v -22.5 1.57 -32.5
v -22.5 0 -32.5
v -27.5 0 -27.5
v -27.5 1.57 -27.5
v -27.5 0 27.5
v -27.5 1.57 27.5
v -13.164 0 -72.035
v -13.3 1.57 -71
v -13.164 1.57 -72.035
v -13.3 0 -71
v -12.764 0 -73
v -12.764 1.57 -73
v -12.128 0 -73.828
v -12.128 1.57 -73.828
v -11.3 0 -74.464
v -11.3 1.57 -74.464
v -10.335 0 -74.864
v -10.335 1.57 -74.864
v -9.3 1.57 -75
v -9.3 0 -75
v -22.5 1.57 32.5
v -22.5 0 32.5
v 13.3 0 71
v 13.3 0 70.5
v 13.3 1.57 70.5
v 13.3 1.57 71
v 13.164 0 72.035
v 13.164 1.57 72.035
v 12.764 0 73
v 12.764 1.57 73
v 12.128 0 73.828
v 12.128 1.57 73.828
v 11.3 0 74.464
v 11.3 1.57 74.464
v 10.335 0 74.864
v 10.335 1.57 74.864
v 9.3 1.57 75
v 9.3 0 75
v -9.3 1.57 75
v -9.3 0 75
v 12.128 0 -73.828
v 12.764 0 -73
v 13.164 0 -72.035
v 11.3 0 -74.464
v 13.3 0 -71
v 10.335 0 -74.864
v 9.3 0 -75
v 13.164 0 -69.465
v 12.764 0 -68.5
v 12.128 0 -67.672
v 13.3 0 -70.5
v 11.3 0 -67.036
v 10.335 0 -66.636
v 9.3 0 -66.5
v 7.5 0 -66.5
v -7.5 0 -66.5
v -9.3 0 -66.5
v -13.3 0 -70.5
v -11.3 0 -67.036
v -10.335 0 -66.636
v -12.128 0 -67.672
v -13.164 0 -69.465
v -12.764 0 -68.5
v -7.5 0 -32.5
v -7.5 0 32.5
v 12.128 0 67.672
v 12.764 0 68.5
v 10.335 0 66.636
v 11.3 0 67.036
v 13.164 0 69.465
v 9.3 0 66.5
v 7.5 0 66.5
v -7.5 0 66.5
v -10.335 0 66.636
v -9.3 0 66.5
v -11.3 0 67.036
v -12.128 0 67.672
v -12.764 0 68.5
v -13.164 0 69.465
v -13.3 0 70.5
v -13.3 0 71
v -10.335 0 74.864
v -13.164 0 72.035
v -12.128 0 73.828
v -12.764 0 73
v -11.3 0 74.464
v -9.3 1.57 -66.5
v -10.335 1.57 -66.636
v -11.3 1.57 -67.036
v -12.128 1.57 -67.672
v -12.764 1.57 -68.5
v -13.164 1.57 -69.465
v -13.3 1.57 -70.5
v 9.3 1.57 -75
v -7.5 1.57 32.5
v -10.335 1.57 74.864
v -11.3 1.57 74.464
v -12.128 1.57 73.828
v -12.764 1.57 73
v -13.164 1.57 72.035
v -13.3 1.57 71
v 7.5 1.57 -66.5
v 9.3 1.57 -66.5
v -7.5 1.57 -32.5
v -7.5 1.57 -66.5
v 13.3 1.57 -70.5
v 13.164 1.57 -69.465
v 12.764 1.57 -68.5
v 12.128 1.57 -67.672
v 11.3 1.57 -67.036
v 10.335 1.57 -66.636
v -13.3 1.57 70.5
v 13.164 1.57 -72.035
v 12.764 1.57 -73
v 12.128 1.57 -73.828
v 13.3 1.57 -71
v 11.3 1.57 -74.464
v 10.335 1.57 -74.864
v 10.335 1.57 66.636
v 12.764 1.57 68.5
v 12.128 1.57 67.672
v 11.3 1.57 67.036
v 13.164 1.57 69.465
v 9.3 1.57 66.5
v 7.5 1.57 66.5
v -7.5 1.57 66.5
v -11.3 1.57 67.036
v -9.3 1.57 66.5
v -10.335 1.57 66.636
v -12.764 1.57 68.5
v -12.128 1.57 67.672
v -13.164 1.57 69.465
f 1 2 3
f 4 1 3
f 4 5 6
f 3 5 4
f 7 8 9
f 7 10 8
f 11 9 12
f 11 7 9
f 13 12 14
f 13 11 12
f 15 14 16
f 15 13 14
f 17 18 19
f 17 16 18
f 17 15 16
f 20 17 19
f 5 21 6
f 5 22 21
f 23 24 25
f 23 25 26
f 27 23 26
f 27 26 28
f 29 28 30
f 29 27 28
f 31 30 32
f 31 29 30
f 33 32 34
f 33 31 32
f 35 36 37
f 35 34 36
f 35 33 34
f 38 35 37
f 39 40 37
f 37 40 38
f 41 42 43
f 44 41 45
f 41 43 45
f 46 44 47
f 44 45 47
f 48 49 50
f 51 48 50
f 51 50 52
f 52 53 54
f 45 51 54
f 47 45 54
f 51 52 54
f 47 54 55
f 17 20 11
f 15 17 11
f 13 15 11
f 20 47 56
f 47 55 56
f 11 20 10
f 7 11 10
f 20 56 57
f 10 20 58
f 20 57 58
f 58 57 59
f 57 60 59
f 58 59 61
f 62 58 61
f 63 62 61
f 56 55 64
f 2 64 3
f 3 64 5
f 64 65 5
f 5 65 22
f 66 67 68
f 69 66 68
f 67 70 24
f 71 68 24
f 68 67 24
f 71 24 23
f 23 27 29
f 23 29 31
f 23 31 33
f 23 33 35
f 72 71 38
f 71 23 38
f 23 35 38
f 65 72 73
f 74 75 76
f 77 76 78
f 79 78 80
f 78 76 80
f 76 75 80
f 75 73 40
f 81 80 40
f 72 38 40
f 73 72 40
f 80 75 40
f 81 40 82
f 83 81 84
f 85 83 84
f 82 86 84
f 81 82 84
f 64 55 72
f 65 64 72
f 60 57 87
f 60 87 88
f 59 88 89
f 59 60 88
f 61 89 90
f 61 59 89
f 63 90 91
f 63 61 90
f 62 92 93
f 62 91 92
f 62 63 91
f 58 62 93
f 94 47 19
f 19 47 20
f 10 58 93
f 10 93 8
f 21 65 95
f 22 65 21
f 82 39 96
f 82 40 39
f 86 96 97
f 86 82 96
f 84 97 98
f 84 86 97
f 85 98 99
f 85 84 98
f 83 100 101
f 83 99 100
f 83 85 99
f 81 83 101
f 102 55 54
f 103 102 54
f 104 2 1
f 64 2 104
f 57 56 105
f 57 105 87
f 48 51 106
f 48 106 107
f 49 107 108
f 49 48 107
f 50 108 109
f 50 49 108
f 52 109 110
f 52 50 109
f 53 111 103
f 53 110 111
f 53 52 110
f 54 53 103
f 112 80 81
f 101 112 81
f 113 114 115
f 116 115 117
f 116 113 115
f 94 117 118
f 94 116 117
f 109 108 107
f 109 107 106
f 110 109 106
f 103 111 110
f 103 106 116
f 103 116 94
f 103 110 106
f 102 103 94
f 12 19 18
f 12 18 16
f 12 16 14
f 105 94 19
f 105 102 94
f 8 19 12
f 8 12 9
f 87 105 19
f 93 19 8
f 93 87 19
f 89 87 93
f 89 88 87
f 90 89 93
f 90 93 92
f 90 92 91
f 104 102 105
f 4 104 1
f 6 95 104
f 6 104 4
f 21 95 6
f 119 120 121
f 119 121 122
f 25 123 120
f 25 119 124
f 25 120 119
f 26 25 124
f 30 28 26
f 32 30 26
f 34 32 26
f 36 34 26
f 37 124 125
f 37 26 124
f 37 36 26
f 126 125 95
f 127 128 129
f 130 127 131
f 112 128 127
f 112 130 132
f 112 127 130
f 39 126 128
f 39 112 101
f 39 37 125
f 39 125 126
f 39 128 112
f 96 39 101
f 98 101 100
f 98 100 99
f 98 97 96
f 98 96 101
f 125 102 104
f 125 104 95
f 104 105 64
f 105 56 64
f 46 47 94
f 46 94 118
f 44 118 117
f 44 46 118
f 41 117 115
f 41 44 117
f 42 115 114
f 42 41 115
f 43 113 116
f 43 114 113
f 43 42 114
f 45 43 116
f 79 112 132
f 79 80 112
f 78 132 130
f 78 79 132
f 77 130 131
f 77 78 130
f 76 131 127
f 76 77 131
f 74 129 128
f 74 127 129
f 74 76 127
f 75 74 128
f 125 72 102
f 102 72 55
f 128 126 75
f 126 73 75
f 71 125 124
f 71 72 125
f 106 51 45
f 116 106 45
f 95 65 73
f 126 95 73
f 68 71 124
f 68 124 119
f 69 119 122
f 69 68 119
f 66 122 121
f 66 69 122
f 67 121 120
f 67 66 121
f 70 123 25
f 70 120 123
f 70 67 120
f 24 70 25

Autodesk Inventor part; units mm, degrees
ref_plane "YZ Plane" through (0, 0, 0) normal (1, 0, 0) x (0, 1, 0)
ref_plane "XZ Plane" through (0, 0, 0) normal (0, 1, 0) x (-1, 0, 0)
ref_plane "XY Plane" through (0, 0, 0) normal (0, 0, 1) x (1, 0, 0)
sketch "Sketch1" plane through (0, 0, 0) normal (0, 1, 0) x (-1, 0, 0)
  line L0 (7.5, 75) -> (-7.5, 75)
  line L1 (-7.5, 75) -> (-7.5, -75)
  line L2 (-7.5, -75) -> (7.5, -75)
  line L3 (7.5, -75) -> (7.5, 75)
  line L4 (-7.5, 75) -> (7.5, -75) construction
  line L5 (-7.5, -75) -> (7.5, 75) construction
  line L6 (7.5, -66.5) -> (9.3, -66.5)
  line L7 (13.3, -70.5) -> (13.3, -71)
  line L8 (9.3, -75) -> (7.5, -75)
  line L9 (7.5, -75) -> (7.5, -66.5)
  arc A0 (13.3, -70.5) -> (9.3, -66.5) centre (9.3, -70.5) ccw
  arc A1 (9.3, -75) -> (13.3, -71) centre (9.3, -71) ccw
  line L10 (0, 75) -> (0, -75) construction
  line L11 (-7.5, -66.5) -> (-9.3, -66.5)
  line L12 (-13.3, -70.5) -> (-13.3, -71)
  line L13 (-9.3, -75) -> (-7.5, -75)
  arc A2 (-9.3, -66.5) -> (-13.3, -70.5) centre (-9.3, -70.5) ccw
  arc A3 (-13.3, -71) -> (-9.3, -75) centre (-9.3, -71) ccw
  line L14 (-7.5, 0) -> (7.5, 0) construction
  line L15 (7.5, 66.5) -> (9.3, 66.5)
  line L16 (13.3, 70.5) -> (13.3, 71)
  line L17 (9.3, 75) -> (7.5, 75)
  arc A4 (9.3, 66.5) -> (13.3, 70.5) centre (9.3, 70.5) ccw
  arc A5 (13.3, 71) -> (9.3, 75) centre (9.3, 71) ccw
  arc A6 (-13.3, 70.5) -> (-9.3, 66.5) centre (-9.3, 70.5) ccw
  line L18 (-13.3, 70.5) -> (-13.3, 71)
  arc A7 (-9.3, 75) -> (-13.3, 71) centre (-9.3, 71) ccw
  line L19 (-9.3, 75) -> (-7.5, 75)
  line L20 (-7.5, 66.5) -> (-9.3, 66.5)
  line L21 (7.5, -20.0447) -> (7.5, 20.0447)
  line L22 (7.5, 32.5) -> (22.5, 32.5)
  line L23 (27.5, 27.5) -> (27.5, -27.5)
  line L24 (22.5, -32.5) -> (7.5, -32.5)
  line L25 (7.5, -32.5) -> (7.5, 32.5)
  line L26 (-7.5, 1.5) -> (-14.5, 1.5)
  line L27 (-14.5, 1.5) -> (-14.5, -1.5)
  line L28 (-14.5, -1.5) -> (-7.5, -1.5)
  line L29 (-7.5, -1.5) -> (-7.5, 1.5)
  circle A8 centre (-12.5, 0) radius 0.98
  line L30 (22.5, -32.5) -> (27.5, -27.5)
  line L31 (22.5, 32.5) -> (27.5, 27.5)
  point P0 (0, 0)
  point P1 (0, 0)
  point P2 (13.3, -75)
  point P3 (13.3, -66.5)
  point P4 (0, 0)
  point P5 (27.5, -32.5)
  point P6 (27.5, 32.5)
  point P7 (27.5, 0)
  point P8 (0, 0)
  point P9 (-11, -1.5)
  point P10 (-14.5, 0)
  point P11 (-7.5, 0)
  point P12 (7.5, -32.5)
  dimension "d0" = 150
  dimension "d1" = 15
  dimension "d2" = 5.8
  dimension "d3" = 8.5
  dimension "d4" = 4
  dimension "d5" = 20
  dimension "d6" = 65
  dimension "d7" = 1.96
  dimension "d8" = 3
  dimension "d9" = 7
  dimension "d10" = 5
  dimension "d11" = 5
  dimension "d12" = 5
  dimension "d13" = 5
  dimension "d14" = 5
  dimension "d17" = 1.8
  dimension "d18" = 0.5
  dimension "d19" = 4
  dimension "d20" = 4
extrude "Extrusion1" add sketch "Sketch1" along normal blind 1.57 contours L3 L2 L1 L0 | L17 A5 L16 A4 L15 L3 | L1 L20 A6 L18 A7 L19 | L22 L31 L23 L30 L24 L3 | L1 L13 A3 L12 A2 L11 | L6 A0 L7 A1 L8 L3
equation "\"d12\" = d11"
equation "\"d13\" = d11"
equation "\"d14\" = d13"
properties part number "linefollower_chassy_model"
